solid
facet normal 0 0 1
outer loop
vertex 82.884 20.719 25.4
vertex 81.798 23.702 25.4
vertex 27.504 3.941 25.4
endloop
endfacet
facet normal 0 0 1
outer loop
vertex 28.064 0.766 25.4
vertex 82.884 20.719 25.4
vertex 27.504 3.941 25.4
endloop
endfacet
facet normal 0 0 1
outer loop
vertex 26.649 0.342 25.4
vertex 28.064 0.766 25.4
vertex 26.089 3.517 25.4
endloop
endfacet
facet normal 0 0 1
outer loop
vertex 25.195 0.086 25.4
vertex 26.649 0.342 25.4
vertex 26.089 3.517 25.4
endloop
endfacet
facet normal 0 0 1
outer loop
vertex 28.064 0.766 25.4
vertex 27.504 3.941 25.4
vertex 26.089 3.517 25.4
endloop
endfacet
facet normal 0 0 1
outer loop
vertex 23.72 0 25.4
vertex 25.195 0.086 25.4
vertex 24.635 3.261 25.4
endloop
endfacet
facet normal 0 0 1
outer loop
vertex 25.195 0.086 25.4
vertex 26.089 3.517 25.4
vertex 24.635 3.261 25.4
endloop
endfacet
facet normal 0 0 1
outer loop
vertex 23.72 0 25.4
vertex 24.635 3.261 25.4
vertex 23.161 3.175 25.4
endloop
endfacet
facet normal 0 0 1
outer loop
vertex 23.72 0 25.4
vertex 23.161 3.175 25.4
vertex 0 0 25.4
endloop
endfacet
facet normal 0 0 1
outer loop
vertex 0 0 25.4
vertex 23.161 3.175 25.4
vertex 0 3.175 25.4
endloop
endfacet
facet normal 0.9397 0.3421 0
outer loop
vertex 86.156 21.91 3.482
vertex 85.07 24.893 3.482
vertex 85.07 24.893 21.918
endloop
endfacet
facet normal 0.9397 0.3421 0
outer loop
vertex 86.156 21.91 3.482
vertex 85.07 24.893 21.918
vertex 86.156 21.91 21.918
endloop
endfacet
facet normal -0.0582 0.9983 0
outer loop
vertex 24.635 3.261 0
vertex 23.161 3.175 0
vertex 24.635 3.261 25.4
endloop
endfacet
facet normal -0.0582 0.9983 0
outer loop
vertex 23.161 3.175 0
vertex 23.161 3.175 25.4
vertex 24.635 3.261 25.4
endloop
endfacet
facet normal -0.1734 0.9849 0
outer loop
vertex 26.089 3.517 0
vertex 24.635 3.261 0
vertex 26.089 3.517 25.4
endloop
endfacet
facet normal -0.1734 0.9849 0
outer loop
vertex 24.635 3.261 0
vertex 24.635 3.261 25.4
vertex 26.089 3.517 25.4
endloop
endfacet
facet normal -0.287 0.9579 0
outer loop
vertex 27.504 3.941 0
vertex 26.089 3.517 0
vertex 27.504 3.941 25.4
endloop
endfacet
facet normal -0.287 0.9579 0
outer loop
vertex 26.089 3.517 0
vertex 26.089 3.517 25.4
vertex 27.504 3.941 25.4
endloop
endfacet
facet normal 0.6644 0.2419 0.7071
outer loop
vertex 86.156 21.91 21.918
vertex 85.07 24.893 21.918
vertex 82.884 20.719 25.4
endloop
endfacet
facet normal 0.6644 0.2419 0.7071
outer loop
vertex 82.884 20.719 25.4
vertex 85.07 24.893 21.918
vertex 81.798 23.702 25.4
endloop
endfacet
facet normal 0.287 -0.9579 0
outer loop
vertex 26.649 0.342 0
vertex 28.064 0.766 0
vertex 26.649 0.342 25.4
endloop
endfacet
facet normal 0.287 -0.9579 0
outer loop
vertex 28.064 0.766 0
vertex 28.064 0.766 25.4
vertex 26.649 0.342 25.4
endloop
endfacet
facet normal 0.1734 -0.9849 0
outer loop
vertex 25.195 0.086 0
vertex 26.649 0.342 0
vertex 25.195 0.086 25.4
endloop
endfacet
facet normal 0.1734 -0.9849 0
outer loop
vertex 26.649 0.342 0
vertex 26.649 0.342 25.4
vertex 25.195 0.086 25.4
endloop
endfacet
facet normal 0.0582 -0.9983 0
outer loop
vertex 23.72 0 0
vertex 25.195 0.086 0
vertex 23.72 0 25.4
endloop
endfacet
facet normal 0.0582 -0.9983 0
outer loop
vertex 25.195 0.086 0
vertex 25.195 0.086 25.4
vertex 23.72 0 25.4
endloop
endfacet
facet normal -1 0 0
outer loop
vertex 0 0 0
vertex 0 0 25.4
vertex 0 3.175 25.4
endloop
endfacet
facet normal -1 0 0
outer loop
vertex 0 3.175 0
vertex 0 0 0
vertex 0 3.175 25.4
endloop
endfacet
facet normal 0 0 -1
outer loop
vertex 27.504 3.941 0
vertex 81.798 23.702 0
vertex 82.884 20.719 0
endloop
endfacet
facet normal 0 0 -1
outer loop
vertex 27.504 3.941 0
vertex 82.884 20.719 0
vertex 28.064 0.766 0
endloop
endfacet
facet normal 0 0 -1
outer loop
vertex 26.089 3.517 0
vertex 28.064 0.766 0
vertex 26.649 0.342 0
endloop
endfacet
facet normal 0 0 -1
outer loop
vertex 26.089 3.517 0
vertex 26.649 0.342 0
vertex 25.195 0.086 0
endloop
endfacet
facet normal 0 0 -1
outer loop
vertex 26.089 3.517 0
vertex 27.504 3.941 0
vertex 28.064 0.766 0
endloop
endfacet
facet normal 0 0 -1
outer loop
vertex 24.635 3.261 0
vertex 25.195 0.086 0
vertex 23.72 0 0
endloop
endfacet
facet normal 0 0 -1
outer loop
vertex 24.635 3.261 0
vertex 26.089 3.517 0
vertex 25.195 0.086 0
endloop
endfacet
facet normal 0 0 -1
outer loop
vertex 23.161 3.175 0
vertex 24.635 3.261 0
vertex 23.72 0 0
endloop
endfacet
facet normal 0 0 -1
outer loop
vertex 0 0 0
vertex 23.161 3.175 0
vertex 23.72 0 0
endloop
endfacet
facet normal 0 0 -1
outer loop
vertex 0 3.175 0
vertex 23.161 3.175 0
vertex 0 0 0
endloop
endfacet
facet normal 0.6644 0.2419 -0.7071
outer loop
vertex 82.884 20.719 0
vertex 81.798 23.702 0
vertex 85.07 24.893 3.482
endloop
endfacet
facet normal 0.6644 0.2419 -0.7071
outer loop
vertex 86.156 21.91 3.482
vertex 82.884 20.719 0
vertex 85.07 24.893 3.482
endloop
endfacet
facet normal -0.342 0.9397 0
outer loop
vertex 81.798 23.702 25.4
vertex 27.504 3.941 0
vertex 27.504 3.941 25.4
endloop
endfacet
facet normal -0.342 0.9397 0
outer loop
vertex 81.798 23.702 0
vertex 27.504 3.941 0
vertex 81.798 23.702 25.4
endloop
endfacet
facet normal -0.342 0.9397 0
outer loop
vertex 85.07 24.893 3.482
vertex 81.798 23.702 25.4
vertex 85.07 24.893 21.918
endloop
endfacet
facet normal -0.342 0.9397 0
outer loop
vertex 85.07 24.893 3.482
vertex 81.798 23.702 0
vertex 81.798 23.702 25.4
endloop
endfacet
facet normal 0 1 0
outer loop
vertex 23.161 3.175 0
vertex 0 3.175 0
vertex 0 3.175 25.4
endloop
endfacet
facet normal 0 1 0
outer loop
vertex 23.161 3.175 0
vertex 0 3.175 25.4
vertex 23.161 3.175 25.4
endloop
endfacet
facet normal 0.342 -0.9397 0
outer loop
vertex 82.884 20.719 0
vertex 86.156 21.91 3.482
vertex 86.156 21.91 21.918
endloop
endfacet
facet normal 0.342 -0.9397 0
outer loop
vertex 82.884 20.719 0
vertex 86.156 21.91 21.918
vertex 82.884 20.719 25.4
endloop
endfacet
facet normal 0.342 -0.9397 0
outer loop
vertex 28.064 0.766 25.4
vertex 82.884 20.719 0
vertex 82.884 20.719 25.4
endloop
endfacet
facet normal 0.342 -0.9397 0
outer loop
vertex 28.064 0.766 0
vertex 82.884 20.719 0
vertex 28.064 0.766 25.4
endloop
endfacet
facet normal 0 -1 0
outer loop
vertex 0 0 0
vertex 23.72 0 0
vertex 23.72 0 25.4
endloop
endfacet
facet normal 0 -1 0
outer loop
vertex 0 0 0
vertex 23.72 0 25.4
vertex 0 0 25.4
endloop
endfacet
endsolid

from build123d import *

# Parameters (mm, degrees)
BOSS_EXTRUDE1_DEPTH = 25.4
FILLET1_R           = 12.7
CUT_EXTRUDE1_DEPTH  = 94.010697189


with BuildPart() as part:
    # Sketch2 → Boss-Extrude1 (new body)
    with BuildSketch(Plane.XY):
        Polygon((0, 0), (0, 3.175), (25.4, 3.175), (85.07048142, 24.893279101), (86.156395375, 21.90975503), (25.959838164, 0), align=None)
    extrude(amount=BOSS_EXTRUDE1_DEPTH)

    # Fillet1
    fillet1_edges = [part.edges().sort_by_distance(p)[0] for p in [
        (25.4, 3.175, 12.7),
        (25.959838164, 0, 12.7),
    ]]
    fillet(fillet1_edges, radius=FILLET1_R)

    # Sketch3 → Cut-Extrude1 (cut, through all)
    with BuildSketch(Plane(origin=(1.950810242, -5.35980709, 0), x_dir=(0.9396926207859078, 0.3420201433256703, 0), z_dir=(-0.3420201433256703, 0.9396926207859079, 0))):
        Polygon((88.454106523, 0), (84.971991459, 0), (88.454106523, -3.482115064), align=None)
        Polygon((88.454106523, -25.4), (88.454106523, -21.917884936), (84.971991459, -25.4), align=None)
    extrude(amount=-CUT_EXTRUDE1_DEPTH, mode=Mode.SUBTRACT)


solid = part.part
